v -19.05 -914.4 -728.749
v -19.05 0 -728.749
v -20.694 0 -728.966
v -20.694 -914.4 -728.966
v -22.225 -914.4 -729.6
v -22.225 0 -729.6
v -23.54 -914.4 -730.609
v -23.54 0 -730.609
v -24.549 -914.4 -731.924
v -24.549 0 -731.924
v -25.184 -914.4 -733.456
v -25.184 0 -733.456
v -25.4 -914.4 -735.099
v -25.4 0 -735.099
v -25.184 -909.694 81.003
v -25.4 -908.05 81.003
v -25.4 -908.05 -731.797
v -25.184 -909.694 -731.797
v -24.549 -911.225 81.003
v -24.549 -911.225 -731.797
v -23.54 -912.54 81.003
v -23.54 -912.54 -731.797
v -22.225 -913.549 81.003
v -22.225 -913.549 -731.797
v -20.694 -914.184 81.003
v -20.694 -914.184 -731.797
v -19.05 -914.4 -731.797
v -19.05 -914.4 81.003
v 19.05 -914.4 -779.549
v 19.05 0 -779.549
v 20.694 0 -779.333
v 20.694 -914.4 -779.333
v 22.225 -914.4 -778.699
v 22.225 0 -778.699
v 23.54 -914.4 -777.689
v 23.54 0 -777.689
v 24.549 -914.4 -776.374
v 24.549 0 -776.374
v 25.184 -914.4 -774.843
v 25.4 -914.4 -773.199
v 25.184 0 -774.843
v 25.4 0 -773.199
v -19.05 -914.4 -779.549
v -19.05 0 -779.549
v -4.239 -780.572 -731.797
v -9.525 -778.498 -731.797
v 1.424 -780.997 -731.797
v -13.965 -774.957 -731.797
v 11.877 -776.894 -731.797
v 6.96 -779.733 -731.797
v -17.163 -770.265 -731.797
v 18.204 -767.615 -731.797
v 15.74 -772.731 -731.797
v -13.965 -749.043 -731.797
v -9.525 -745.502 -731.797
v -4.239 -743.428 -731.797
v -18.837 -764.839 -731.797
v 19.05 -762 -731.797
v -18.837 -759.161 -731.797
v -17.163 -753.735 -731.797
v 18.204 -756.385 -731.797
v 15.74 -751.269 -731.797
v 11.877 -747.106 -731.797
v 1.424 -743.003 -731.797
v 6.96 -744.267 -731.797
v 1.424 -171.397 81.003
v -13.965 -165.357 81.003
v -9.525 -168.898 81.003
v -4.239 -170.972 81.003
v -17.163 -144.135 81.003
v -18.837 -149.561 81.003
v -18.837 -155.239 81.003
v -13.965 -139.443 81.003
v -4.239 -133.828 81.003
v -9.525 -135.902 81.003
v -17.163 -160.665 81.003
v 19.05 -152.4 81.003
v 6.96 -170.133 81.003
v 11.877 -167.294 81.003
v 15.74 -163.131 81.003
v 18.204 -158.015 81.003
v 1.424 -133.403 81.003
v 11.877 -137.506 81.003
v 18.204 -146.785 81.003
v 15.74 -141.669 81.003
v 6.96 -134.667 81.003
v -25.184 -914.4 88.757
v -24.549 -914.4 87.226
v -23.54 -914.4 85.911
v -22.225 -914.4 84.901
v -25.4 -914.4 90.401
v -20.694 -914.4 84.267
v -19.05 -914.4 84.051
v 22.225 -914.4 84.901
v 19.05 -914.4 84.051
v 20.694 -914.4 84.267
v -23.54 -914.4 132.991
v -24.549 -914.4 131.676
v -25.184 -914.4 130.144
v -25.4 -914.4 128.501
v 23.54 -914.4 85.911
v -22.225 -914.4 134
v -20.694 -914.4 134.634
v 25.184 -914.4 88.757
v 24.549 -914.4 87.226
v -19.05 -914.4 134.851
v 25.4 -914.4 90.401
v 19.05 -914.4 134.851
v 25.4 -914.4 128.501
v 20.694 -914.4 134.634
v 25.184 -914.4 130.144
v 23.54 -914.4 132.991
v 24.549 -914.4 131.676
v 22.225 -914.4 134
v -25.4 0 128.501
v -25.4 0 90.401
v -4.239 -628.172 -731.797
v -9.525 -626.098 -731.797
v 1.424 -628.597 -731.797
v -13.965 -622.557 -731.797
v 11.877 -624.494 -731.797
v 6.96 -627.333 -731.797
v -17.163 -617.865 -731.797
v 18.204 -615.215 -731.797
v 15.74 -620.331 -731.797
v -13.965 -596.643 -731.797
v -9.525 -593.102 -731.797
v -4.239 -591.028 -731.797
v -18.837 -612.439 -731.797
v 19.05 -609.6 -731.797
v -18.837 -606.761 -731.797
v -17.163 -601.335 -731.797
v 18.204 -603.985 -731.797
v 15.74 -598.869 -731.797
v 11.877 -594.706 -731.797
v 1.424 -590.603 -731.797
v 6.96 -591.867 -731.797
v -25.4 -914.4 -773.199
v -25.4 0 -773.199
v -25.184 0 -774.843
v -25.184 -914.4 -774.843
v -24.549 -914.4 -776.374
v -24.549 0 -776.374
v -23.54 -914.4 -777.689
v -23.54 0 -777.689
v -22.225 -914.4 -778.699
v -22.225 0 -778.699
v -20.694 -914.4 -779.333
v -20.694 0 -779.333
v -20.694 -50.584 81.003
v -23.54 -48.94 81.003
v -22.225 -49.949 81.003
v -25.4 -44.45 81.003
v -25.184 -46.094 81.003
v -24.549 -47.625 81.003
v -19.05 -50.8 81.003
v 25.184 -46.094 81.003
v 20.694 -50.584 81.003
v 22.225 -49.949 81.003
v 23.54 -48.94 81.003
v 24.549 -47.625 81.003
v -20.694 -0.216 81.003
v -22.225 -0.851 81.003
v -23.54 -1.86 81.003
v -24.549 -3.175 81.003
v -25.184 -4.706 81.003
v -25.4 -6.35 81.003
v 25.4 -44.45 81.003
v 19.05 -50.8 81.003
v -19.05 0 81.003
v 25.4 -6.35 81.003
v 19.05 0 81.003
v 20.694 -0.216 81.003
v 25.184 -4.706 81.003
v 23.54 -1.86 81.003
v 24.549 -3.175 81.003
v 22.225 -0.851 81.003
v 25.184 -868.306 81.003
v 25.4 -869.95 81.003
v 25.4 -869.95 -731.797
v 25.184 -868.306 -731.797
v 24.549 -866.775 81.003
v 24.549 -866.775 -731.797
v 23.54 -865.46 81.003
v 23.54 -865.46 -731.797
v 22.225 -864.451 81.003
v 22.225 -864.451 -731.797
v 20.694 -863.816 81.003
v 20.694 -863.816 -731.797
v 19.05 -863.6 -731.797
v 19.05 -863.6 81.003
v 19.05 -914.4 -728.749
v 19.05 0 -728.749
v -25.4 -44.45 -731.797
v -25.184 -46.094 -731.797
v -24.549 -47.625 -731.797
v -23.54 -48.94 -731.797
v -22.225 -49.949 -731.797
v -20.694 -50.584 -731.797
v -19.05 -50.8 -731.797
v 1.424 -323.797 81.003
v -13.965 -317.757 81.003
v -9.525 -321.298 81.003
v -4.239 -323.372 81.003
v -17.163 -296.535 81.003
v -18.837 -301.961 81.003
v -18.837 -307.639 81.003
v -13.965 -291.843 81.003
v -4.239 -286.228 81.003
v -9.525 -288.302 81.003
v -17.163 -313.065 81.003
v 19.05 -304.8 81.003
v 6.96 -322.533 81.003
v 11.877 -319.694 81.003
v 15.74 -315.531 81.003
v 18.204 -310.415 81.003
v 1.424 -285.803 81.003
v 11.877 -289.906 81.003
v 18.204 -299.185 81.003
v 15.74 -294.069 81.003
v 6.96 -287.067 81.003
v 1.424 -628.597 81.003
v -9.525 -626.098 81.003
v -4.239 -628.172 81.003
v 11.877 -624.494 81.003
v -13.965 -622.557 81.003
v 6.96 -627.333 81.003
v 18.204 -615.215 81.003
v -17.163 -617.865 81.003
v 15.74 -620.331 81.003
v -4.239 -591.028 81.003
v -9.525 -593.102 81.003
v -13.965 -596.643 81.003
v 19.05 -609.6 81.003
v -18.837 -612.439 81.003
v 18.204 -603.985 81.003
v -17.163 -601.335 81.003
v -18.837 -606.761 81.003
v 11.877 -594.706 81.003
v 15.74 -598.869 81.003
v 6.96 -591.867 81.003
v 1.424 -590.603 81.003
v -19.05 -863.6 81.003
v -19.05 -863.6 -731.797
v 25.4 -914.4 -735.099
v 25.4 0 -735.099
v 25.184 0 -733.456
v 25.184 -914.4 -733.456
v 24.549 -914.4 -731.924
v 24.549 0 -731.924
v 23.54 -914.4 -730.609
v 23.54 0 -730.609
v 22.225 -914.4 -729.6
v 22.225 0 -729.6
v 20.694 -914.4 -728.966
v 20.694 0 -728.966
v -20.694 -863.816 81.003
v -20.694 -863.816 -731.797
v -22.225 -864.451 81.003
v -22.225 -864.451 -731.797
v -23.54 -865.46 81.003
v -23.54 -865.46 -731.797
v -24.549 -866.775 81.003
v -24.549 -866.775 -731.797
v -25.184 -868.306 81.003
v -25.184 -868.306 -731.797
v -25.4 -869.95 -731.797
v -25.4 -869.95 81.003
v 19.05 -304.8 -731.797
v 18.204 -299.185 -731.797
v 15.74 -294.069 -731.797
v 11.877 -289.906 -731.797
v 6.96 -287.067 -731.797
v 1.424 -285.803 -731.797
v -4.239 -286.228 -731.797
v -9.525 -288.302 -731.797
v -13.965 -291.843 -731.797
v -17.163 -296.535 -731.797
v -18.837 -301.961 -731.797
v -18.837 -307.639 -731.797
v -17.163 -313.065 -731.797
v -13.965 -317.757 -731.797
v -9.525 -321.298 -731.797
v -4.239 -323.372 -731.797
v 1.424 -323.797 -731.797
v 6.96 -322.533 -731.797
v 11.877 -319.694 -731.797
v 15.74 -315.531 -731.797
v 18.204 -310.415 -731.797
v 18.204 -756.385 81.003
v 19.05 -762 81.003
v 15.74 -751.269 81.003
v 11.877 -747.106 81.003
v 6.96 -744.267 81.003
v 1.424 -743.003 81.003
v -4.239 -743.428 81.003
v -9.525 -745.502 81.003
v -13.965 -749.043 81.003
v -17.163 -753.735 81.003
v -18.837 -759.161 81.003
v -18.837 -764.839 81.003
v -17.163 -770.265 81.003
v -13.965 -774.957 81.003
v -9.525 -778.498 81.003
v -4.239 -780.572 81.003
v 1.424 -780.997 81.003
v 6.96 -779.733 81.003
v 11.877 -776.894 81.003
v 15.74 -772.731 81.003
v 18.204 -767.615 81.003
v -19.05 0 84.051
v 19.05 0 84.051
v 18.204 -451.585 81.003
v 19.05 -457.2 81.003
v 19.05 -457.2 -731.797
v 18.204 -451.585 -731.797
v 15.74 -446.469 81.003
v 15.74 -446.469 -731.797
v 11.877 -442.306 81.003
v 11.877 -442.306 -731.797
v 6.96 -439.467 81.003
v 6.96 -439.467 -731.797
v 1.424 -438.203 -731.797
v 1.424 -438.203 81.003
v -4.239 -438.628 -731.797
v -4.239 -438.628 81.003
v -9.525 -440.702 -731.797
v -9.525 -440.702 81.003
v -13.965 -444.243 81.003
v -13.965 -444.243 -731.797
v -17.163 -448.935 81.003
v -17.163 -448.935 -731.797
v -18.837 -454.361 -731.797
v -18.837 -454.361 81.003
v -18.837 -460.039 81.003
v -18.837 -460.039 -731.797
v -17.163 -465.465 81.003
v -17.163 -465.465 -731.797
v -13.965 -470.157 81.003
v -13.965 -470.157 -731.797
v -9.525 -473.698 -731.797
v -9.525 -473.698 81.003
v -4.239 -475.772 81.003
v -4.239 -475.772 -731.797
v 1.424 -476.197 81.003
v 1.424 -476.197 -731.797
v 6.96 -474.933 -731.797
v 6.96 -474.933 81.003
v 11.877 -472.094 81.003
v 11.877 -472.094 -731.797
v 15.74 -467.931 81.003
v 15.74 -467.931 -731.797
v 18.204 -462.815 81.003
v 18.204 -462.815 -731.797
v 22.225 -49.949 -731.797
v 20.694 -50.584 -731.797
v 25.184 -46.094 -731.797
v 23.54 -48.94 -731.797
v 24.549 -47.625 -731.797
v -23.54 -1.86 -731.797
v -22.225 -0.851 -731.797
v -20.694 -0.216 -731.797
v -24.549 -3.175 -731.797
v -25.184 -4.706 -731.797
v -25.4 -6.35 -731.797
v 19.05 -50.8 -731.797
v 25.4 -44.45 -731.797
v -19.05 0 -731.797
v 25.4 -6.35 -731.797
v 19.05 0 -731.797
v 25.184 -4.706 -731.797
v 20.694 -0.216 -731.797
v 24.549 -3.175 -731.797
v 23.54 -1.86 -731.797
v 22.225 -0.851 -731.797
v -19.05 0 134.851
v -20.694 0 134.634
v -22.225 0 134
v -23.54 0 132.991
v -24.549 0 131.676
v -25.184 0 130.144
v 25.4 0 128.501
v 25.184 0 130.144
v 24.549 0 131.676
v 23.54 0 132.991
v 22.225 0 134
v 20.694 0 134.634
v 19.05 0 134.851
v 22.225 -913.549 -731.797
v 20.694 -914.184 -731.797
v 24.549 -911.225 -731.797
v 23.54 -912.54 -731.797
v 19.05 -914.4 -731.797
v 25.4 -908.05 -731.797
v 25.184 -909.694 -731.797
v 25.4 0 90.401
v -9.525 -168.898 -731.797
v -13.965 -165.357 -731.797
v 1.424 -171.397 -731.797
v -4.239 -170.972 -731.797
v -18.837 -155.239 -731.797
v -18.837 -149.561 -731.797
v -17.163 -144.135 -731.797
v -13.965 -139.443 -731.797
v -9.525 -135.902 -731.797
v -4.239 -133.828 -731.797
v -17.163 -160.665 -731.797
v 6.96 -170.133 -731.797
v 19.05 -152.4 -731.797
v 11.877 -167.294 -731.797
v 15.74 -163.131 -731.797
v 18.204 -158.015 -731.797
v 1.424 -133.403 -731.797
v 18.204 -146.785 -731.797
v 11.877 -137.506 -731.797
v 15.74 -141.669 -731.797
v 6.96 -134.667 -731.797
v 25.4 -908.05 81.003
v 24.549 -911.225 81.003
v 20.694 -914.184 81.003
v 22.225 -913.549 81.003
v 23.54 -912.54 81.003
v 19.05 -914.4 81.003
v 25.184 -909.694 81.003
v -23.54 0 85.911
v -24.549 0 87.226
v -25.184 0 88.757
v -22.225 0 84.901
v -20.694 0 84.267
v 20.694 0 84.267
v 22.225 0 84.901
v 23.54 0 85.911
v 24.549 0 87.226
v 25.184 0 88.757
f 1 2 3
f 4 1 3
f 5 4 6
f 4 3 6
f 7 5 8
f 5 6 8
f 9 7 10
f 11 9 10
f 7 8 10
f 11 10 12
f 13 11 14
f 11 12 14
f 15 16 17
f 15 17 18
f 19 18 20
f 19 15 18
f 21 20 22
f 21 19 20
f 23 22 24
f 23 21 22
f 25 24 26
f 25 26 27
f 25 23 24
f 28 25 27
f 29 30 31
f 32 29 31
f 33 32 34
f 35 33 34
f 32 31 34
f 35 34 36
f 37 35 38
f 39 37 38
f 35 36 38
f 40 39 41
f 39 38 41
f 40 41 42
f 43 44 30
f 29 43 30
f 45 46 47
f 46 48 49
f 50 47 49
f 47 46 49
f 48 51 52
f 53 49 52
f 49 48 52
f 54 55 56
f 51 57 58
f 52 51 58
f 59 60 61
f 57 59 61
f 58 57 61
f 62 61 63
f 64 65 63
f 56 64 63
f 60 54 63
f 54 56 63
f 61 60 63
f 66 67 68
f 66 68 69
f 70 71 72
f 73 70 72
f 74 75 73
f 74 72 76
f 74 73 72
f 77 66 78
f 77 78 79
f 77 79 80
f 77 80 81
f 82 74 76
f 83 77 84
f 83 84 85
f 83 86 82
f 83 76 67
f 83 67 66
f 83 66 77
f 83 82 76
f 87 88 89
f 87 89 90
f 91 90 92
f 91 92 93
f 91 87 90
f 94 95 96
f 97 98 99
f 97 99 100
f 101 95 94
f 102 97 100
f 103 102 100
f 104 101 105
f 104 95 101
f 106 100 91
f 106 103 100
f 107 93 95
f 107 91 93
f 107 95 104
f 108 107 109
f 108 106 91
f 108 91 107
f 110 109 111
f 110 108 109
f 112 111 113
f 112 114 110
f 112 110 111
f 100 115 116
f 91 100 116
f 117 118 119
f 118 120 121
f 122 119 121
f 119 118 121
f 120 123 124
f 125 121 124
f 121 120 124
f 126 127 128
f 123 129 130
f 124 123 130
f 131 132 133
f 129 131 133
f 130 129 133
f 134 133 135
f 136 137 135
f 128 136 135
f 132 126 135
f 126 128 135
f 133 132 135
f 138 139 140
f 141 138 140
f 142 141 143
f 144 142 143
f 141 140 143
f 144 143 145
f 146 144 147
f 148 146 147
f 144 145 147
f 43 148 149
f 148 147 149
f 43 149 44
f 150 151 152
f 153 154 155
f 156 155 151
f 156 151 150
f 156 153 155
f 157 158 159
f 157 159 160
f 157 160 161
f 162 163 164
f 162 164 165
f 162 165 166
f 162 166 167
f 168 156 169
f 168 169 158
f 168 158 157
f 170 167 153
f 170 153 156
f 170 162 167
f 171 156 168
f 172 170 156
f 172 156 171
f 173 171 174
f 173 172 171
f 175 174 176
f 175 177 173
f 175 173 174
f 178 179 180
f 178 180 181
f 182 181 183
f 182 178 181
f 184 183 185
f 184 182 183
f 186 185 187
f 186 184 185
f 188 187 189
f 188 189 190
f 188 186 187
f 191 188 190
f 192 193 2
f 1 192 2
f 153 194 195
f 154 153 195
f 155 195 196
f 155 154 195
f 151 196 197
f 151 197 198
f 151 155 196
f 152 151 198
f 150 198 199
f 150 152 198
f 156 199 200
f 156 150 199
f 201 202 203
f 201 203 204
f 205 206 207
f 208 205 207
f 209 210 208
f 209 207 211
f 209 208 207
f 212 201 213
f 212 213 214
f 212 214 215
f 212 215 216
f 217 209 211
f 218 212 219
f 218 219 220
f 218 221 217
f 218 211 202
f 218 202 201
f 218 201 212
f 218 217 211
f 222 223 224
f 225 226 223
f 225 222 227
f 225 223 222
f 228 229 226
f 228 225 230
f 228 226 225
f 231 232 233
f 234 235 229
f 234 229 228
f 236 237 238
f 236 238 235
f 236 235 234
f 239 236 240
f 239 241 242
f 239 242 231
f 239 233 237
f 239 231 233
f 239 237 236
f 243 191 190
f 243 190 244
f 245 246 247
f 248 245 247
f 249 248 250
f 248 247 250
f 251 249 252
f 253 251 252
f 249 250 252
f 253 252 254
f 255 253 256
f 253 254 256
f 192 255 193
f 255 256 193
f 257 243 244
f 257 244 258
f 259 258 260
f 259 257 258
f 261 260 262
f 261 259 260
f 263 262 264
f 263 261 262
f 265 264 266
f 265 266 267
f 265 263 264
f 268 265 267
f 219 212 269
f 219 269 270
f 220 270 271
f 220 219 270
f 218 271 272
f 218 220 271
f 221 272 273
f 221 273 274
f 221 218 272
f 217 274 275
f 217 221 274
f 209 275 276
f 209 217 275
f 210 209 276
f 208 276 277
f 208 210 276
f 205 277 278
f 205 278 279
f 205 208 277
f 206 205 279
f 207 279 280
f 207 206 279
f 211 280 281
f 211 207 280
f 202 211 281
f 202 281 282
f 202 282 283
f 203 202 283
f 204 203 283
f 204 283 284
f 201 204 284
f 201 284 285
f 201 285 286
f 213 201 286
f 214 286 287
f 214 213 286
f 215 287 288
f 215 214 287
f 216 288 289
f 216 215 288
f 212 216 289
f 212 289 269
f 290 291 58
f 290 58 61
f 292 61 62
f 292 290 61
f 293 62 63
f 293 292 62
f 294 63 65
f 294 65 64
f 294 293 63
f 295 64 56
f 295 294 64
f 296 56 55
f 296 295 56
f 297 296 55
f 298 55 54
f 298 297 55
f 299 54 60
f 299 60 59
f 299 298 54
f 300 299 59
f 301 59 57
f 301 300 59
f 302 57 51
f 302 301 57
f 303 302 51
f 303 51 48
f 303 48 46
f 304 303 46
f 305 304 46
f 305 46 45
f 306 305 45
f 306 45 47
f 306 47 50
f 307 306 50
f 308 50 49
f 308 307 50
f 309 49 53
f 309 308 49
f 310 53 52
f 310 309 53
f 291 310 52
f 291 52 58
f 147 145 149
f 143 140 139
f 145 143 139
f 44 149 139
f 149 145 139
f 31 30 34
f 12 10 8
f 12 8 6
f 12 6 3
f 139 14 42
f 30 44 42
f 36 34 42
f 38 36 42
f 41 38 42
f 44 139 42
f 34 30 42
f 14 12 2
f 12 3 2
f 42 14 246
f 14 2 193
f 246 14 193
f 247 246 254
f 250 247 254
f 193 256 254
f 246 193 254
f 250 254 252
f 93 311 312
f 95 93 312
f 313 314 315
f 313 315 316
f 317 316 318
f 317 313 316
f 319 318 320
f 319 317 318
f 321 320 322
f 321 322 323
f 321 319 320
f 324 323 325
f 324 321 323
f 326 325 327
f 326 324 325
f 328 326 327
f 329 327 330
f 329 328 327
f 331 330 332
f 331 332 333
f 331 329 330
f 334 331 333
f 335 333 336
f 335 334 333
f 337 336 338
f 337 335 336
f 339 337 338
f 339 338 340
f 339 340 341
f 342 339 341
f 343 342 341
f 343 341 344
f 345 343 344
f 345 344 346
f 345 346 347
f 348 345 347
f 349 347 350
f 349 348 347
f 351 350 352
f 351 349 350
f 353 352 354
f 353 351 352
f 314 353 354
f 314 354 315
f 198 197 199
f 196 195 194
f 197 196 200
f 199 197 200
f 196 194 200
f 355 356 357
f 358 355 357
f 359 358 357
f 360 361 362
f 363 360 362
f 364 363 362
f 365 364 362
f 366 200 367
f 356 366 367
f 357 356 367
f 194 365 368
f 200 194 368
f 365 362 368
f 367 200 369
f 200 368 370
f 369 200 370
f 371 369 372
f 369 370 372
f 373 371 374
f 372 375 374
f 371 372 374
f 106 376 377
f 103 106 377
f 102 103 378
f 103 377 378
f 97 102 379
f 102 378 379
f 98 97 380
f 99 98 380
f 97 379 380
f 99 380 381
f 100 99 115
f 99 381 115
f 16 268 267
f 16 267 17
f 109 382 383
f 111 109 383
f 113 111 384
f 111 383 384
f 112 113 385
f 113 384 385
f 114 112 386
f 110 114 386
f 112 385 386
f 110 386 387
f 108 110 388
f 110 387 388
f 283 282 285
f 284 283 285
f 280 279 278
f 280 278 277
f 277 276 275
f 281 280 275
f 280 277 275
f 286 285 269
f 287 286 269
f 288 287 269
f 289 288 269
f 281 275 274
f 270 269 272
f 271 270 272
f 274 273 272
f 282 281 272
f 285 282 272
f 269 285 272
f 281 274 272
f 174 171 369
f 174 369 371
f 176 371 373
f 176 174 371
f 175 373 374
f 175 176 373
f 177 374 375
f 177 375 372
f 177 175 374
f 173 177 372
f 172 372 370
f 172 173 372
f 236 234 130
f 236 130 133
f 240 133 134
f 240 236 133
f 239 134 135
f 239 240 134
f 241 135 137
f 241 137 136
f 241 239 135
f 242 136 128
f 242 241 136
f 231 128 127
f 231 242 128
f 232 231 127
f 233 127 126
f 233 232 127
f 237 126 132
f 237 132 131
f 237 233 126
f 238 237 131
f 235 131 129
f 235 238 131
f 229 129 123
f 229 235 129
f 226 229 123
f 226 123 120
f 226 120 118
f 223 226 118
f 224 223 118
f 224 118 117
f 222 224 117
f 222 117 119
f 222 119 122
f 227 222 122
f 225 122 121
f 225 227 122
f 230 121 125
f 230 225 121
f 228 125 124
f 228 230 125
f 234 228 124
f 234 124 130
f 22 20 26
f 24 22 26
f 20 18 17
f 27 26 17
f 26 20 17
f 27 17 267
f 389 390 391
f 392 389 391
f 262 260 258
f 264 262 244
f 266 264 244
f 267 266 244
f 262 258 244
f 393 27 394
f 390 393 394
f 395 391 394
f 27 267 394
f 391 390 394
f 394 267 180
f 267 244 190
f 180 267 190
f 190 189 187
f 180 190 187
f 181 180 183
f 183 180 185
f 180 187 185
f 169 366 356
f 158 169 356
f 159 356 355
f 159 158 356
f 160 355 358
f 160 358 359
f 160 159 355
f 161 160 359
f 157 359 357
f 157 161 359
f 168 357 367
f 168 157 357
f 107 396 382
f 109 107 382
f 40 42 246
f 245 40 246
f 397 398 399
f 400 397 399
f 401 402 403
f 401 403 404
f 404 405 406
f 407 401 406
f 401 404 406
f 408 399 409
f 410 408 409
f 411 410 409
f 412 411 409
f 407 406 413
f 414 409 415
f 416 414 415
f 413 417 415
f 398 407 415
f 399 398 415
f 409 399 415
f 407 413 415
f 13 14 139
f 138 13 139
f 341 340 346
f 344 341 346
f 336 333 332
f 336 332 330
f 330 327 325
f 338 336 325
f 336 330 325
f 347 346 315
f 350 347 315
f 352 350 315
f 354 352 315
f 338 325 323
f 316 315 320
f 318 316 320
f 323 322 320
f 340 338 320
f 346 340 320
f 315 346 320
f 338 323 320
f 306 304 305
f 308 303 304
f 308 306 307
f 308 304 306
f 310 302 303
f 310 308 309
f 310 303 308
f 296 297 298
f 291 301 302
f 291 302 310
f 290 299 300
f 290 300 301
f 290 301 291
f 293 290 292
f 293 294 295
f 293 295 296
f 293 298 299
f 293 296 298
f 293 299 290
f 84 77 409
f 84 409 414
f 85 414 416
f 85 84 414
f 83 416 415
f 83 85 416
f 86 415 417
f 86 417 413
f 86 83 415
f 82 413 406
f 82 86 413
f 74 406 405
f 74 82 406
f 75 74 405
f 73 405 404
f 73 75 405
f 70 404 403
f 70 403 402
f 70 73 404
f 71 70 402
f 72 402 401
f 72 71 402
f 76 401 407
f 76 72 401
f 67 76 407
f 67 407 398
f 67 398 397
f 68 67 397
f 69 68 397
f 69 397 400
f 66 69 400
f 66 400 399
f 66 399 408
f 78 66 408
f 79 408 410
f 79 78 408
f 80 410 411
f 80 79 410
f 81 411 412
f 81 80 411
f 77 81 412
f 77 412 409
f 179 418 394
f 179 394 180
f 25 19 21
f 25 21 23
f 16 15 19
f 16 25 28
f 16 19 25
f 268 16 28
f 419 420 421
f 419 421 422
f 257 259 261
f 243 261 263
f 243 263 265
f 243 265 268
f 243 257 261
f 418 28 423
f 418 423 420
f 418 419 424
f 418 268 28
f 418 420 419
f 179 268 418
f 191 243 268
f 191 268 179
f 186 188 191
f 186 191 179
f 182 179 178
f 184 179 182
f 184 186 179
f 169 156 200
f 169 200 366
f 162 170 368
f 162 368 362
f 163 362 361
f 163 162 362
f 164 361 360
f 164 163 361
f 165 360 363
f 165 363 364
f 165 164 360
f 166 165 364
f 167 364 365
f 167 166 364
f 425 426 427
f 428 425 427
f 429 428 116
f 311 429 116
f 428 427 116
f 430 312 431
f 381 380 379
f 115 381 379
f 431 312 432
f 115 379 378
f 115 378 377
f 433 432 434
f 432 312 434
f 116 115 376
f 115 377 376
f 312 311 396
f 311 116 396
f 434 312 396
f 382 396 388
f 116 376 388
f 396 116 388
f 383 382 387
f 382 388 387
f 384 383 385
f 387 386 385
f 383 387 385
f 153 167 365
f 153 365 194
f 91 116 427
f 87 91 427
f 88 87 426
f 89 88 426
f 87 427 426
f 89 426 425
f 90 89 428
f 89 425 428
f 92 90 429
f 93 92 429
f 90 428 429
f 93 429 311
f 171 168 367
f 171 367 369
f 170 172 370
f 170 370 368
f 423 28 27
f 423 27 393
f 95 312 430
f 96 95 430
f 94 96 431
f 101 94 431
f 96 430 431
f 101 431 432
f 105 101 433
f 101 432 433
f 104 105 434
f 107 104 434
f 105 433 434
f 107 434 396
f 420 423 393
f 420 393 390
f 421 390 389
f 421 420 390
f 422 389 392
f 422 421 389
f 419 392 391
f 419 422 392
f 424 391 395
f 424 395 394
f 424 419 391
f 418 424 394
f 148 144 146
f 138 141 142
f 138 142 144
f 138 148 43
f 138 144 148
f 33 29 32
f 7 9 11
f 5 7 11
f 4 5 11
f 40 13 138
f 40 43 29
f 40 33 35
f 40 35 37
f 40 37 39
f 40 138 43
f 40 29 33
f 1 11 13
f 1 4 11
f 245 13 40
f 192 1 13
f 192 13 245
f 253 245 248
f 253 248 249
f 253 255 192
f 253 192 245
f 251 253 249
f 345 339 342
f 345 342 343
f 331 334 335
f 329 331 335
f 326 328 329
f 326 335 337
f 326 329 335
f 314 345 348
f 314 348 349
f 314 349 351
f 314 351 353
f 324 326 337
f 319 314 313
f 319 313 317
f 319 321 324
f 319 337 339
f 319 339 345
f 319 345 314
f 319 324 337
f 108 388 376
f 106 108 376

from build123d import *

# Parameters (mm, degrees)
F1_DEPTH = 914.4
F3_R     = 19.05
F4_DEPTH = 812.8


with BuildPart() as f1:
    # F0 (on Front) → F1 (new body)
    with BuildSketch(Plane.XZ):
        with BuildLine():
            Line((-19.05, 84.0507361742), (19.05, 84.0507361742))
            ThreePointArc((19.05, 84.0507361742), (23.5401280605, 85.9106081136), (25.4, 90.4007361742))
            Line((25.4, 90.4007361742), (25.4, 128.5007361742))
            ThreePointArc((25.4, 128.5007361742), (23.5401280605, 132.9908642347), (19.05, 134.8507361742))
            Line((19.05, 134.8507361742), (-19.05, 134.8507361742))
            ThreePointArc((-19.05, 134.8507361742), (-23.5401280605, 132.9908642347), (-25.4, 128.5007361742))
            Line((-25.4, 128.5007361742), (-25.4, 90.4007361742))
            ThreePointArc((-25.4, 90.4007361742), (-23.5401280605, 85.9106081136), (-19.05, 84.0507361742))
        make_face()
    extrude(amount=F1_DEPTH)


with BuildPart() as f1b:
    # F0 (on Front) → F1, piece 2 (new body)
    with BuildSketch(Plane.XZ):
        with BuildLine():
            ThreePointArc((25.4, -735.0992638258), (23.5401280605, -730.6091357653), (19.05, -728.7492638258))
            Line((19.05, -728.7492638258), (-19.05, -728.7492638258))
            ThreePointArc((-19.05, -728.7492638258), (-23.5401280605, -730.6091357653), (-25.4, -735.0992638258))
            Line((-25.4, -735.0992638258), (-25.4, -773.1992638258))
            ThreePointArc((-25.4, -773.1992638258), (-23.5401280605, -777.6893918864), (-19.05, -779.5492638258))
            Line((-19.05, -779.5492638258), (19.05, -779.5492638258))
            ThreePointArc((19.05, -779.5492638258), (23.5401280605, -777.6893918864), (25.4, -773.1992638258))
            Line((25.4, -773.1992638258), (25.4, -735.0992638258))
        make_face()
    extrude(amount=F1_DEPTH)


with BuildPart() as f4:
    # F3 (on offset) → F4 (new body)
    with BuildSketch(Plane.XY.offset(81.0033306479)):
        with Locations((0, -152.4)):
            Circle(F3_R)
    extrude(amount=-F4_DEPTH)


with BuildPart() as f4b:
    # F3 (on offset) → F4, piece 2 (new body)
    with BuildSketch(Plane.XY.offset(81.0033306479)):
        with Locations((0, -304.8)):
            Circle(F3_R)
    extrude(amount=-F4_DEPTH)


with BuildPart() as f4c:
    # F3 (on offset) → F4, piece 3 (new body)
    with BuildSketch(Plane.XY.offset(81.0033306479)):
        with Locations((0, -609.6)):
            Circle(F3_R)
    extrude(amount=-F4_DEPTH)


with BuildPart() as f4d:
    # F3 (on offset) → F4, piece 4 (new body)
    with BuildSketch(Plane.XY.offset(81.0033306479)):
        with Locations((0, -762)):
            Circle(F3_R)
    extrude(amount=-F4_DEPTH)


with BuildPart() as f4e:
    # F3 (on offset) → F4, piece 5 (new body)
    with BuildSketch(Plane.XY.offset(81.0033306479)):
        with Locations((0, -457.2)):
            Circle(F3_R)
    extrude(amount=-F4_DEPTH)


with BuildPart() as f4f:
    # F3 (on offset) → F4, piece 6 (new body)
    with BuildSketch(Plane.XY.offset(81.0033306479)):
        with BuildLine():
            ThreePointArc((25.4, -6.35), (23.5401280605, -1.8598719395), (19.05, 0))
            Line((19.05, 0), (-19.05, 0))
            ThreePointArc((-19.05, 0), (-23.5401280605, -1.8598719395), (-25.4, -6.35))
            Line((-25.4, -6.35), (-25.4, -44.45))
            ThreePointArc((-25.4, -44.45), (-23.5401280605, -48.9401280605), (-19.05, -50.8))
            Line((-19.05, -50.8), (19.05, -50.8))
            ThreePointArc((19.05, -50.8), (23.5401280605, -48.9401280605), (25.4, -44.45))
            Line((25.4, -44.45), (25.4, -6.35))
        make_face()
    extrude(amount=-F4_DEPTH)


with BuildPart() as f4g:
    # F3 (on offset) → F4, piece 7 (new body)
    with BuildSketch(Plane.XY.offset(81.0033306479)):
        with BuildLine():
            ThreePointArc((25.4, -869.95), (23.5401280605, -865.4598719395), (19.05, -863.6))
            Line((19.05, -863.6), (-19.05, -863.6))
            ThreePointArc((-19.05, -863.6), (-23.5401280605, -865.4598719395), (-25.4, -869.95))
            Line((-25.4, -869.95), (-25.4, -908.05))
            ThreePointArc((-25.4, -908.05), (-23.5401280605, -912.5401280605), (-19.05, -914.4))
            Line((-19.05, -914.4), (19.05, -914.4))
            ThreePointArc((19.05, -914.4), (23.5401280605, -912.5401280605), (25.4, -908.05))
            Line((25.4, -908.05), (25.4, -869.95))
        make_face()
    extrude(amount=-F4_DEPTH)


solid = Compound([f1.part, f1b.part, f4.part, f4b.part, f4c.part, f4d.part, f4e.part, f4f.part, f4g.part])
